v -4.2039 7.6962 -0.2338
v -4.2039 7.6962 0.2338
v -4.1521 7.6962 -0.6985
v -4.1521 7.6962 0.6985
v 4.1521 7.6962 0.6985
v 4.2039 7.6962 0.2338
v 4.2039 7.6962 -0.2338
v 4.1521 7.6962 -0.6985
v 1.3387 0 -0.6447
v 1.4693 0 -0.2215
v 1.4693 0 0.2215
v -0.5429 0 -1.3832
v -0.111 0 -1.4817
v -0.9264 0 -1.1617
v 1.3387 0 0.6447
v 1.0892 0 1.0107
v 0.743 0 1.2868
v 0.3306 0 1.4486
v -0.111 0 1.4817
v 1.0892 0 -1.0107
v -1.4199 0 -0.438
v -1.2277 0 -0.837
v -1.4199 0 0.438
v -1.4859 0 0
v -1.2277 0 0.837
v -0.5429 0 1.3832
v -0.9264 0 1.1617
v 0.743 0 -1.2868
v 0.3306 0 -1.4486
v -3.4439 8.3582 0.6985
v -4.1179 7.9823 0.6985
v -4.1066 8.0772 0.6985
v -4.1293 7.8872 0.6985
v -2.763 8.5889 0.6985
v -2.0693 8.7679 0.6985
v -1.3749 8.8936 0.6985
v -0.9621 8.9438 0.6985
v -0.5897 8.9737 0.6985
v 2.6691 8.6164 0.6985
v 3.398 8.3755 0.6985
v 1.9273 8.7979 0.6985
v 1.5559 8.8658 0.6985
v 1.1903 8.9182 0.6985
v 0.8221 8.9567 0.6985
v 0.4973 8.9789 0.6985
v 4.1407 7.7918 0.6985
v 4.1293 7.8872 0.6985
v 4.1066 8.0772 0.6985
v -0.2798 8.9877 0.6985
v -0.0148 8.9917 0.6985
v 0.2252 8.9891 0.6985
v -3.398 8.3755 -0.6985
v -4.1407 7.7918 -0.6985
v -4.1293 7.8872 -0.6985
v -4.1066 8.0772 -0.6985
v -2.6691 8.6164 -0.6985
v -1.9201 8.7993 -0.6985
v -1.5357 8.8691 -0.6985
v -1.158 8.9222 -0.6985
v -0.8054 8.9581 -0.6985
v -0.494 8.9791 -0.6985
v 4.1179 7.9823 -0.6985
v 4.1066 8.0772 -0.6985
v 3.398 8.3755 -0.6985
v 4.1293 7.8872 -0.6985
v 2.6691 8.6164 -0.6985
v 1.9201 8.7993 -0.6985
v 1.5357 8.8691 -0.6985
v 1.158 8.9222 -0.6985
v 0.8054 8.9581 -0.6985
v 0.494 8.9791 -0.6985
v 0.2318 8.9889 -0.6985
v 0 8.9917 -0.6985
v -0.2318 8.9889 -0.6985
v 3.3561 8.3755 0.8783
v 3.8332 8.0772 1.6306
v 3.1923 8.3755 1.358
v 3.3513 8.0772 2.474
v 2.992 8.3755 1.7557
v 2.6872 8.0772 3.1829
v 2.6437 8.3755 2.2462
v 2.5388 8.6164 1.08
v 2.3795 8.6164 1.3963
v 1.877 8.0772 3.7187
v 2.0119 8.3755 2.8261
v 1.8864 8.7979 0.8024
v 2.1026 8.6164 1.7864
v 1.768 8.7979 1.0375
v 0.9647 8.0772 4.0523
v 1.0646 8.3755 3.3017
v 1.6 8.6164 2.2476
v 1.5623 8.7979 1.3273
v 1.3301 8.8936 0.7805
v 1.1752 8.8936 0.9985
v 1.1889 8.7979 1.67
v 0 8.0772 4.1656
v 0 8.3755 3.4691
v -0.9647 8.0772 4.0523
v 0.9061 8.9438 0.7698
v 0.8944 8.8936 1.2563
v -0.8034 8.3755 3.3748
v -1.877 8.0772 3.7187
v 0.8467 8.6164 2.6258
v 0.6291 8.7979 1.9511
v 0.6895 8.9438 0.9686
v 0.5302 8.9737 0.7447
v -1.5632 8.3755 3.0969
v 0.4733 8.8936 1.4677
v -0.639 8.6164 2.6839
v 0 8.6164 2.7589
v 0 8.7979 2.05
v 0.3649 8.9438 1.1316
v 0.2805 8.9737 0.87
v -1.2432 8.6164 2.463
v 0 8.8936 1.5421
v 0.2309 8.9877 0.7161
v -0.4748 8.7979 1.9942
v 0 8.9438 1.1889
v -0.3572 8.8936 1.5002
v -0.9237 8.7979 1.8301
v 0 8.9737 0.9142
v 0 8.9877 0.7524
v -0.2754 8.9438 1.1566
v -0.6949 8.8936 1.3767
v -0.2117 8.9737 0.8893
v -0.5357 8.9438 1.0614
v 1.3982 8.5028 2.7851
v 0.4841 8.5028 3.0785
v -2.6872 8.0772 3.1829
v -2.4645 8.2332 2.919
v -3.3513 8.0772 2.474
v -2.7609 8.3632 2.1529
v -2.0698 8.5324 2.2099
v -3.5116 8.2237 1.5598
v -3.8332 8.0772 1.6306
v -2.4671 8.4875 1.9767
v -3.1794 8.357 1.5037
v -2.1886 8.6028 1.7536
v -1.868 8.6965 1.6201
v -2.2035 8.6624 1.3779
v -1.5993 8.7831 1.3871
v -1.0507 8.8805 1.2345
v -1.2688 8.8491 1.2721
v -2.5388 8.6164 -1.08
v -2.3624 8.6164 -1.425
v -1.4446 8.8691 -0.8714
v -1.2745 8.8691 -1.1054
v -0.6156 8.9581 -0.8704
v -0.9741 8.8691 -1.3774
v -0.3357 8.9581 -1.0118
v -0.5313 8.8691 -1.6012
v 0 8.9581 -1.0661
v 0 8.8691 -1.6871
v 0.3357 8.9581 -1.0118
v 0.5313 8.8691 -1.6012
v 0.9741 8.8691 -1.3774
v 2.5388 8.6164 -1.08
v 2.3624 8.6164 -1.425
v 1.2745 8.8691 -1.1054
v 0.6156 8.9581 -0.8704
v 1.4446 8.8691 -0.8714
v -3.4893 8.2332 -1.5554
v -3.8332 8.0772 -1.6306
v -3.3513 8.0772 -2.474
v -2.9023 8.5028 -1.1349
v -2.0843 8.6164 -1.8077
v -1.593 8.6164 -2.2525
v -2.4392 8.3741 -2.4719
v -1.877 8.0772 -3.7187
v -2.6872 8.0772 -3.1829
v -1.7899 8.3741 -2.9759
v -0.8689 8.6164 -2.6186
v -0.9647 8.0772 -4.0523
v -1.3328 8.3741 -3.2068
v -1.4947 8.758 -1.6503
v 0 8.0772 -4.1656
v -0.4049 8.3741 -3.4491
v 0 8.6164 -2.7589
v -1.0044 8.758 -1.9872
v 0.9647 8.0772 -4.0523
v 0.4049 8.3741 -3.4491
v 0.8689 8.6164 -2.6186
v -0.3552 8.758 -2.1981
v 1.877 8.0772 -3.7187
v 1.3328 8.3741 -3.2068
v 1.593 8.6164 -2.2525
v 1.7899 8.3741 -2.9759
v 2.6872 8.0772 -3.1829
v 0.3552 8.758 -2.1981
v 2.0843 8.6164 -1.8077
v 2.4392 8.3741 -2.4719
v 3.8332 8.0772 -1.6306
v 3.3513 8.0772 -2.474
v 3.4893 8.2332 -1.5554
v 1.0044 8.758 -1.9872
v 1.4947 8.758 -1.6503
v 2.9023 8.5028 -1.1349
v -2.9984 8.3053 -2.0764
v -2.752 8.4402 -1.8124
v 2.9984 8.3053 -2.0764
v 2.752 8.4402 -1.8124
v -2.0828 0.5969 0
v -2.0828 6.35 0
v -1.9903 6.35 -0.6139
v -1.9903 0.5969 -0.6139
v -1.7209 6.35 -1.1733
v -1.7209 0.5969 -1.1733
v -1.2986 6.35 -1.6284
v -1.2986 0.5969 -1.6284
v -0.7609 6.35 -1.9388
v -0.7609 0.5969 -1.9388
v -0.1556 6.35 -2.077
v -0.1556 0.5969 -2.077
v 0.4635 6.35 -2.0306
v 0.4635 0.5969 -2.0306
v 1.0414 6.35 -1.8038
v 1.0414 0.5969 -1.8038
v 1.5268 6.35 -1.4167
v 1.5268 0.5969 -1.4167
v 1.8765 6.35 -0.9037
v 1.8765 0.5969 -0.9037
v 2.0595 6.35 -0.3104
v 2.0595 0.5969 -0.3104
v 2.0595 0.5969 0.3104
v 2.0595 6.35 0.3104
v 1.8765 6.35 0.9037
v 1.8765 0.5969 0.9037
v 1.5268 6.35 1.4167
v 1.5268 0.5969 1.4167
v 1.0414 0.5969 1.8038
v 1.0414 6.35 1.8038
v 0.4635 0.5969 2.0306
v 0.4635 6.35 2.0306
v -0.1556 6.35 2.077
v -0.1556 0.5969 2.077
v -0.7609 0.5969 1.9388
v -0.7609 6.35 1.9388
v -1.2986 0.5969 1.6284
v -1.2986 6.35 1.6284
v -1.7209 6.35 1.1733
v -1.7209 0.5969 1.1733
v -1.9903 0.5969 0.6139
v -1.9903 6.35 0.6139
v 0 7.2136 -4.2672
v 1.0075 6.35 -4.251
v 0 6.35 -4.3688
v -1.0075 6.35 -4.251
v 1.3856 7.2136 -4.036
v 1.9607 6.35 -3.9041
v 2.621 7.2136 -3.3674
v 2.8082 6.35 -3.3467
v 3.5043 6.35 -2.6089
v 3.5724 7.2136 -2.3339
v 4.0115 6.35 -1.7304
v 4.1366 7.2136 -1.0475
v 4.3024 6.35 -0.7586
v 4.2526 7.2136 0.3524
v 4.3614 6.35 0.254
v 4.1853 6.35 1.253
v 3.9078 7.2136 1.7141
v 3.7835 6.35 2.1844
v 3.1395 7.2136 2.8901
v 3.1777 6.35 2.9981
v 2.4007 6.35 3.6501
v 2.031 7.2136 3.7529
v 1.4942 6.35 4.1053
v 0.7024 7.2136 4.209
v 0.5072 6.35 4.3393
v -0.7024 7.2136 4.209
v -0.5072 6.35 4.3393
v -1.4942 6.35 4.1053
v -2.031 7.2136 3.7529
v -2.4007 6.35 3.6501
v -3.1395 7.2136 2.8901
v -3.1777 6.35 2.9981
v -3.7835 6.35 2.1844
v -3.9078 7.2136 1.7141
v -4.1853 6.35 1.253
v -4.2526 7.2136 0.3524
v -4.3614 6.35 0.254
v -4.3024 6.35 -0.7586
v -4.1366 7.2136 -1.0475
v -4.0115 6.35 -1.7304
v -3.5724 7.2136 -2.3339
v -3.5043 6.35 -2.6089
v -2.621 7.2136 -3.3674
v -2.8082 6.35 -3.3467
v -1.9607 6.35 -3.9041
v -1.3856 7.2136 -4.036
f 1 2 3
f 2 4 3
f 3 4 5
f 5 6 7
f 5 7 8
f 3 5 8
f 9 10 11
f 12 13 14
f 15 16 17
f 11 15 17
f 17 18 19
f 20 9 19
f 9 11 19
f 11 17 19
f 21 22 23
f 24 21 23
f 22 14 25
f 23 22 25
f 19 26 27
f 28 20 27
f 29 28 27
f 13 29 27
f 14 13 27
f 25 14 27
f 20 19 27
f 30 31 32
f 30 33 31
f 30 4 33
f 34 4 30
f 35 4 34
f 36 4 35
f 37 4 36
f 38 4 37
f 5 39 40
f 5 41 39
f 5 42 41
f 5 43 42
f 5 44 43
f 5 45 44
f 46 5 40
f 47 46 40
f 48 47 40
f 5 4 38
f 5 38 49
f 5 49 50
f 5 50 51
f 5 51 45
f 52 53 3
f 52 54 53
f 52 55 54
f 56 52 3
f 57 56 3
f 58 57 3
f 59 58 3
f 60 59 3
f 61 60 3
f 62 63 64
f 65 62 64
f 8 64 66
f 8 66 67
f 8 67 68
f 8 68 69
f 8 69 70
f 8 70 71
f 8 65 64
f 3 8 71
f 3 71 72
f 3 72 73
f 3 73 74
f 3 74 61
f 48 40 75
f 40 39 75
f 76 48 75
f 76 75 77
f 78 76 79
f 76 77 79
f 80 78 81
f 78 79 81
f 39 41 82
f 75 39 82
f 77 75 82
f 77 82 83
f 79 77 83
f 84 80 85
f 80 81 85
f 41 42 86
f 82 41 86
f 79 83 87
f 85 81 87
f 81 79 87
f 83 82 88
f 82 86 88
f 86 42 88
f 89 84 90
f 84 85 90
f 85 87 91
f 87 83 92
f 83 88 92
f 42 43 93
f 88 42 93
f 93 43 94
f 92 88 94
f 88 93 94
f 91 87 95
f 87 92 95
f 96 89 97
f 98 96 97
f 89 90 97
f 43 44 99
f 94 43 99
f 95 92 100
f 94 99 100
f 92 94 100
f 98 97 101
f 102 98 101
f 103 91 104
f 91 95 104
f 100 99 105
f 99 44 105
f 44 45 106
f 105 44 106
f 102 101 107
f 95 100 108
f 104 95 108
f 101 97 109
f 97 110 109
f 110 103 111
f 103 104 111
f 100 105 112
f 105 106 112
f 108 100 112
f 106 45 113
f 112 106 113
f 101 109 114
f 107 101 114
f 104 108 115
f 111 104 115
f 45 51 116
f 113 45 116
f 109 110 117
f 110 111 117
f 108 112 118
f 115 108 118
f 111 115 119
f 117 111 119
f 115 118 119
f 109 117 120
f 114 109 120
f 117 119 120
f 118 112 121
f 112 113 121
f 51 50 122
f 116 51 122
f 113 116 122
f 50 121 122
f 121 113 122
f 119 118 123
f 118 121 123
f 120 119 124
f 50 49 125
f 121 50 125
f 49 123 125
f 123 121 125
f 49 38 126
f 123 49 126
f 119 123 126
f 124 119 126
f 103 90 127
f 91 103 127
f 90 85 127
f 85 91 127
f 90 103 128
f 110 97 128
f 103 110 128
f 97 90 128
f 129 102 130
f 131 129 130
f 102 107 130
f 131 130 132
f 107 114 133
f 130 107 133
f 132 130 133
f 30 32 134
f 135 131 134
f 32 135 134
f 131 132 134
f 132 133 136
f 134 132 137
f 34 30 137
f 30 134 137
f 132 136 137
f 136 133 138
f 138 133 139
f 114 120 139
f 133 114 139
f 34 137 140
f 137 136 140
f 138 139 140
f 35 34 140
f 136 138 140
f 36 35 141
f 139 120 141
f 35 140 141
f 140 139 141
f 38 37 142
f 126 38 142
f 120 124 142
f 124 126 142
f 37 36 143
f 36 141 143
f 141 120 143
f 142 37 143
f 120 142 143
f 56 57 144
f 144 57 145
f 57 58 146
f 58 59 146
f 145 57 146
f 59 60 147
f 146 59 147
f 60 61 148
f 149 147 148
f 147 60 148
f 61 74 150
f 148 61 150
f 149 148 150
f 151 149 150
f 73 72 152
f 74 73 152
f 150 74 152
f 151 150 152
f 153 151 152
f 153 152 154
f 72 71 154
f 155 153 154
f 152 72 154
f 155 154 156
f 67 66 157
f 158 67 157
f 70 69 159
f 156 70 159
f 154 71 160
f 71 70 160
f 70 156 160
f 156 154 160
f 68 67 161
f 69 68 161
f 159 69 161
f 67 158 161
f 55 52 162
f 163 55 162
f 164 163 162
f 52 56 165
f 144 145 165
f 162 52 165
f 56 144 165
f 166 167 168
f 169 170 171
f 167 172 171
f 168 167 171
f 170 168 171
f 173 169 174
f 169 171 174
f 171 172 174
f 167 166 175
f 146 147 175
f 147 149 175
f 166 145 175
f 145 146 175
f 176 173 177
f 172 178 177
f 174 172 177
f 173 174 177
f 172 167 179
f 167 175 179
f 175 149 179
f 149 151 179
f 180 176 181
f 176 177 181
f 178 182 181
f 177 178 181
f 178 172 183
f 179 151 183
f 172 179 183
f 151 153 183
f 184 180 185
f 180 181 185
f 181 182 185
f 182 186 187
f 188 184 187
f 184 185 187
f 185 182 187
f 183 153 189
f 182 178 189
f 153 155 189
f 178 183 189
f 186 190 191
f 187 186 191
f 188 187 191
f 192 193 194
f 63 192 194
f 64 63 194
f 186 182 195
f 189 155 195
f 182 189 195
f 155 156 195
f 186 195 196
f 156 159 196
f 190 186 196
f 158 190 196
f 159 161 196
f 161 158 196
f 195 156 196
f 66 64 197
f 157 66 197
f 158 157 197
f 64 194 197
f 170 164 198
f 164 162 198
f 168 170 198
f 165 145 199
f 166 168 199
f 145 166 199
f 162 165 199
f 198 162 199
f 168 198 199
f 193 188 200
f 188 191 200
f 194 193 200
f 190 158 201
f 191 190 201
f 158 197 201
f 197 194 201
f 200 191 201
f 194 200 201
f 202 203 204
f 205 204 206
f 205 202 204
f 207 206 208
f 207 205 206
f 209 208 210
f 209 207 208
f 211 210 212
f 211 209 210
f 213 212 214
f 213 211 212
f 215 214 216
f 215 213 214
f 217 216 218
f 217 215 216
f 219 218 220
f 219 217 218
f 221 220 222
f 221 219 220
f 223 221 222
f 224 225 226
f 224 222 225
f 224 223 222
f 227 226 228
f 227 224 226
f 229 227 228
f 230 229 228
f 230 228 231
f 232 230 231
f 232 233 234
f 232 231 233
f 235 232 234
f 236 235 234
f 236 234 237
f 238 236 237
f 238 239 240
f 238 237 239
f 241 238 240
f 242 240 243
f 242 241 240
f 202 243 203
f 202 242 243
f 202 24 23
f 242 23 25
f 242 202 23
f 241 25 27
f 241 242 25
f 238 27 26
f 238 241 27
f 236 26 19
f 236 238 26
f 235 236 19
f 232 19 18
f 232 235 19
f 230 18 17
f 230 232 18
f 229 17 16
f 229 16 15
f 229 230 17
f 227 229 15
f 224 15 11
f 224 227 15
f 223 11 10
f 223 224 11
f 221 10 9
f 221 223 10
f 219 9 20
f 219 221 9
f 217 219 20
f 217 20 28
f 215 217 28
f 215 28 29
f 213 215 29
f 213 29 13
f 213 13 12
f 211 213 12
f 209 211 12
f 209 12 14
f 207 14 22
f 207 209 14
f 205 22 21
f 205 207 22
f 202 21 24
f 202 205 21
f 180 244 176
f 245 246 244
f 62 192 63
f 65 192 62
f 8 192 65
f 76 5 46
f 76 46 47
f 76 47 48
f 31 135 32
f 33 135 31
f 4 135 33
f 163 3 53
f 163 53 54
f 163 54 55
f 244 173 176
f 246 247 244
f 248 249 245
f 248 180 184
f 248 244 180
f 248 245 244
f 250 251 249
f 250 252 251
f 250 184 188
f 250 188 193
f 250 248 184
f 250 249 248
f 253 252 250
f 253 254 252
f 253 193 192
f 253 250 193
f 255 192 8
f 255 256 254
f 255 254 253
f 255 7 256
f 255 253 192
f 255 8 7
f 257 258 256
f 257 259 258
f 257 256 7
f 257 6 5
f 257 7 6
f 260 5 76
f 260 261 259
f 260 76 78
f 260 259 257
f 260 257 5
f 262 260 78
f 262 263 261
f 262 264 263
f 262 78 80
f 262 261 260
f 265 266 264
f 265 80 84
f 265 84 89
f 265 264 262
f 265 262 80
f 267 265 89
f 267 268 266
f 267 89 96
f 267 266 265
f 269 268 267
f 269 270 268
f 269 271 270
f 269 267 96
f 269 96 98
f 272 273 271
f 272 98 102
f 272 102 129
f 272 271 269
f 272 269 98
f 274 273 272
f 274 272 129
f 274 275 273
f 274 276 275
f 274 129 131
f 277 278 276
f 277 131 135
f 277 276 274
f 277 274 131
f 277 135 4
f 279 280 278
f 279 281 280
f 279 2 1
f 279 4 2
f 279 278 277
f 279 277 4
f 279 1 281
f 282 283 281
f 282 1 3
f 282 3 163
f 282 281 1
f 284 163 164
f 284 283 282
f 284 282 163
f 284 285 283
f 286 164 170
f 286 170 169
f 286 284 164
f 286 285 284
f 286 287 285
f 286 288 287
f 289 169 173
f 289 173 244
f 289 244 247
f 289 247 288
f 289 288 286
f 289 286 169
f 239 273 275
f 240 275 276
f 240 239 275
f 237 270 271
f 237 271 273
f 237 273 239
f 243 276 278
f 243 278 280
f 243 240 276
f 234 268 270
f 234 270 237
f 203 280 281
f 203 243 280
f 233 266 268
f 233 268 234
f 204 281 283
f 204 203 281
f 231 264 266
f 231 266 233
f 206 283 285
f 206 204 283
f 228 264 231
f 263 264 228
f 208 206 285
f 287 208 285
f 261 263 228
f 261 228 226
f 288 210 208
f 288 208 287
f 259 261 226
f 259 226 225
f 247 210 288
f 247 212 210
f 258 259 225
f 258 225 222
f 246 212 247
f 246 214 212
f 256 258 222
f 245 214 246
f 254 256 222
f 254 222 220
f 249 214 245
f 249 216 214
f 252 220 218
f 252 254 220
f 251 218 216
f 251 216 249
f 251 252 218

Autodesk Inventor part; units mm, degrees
ref_plane "YZ Plane" through (0, 0, 0) normal (1, 0, 0) x (0, 1, 0)
ref_plane "XZ Plane" through (0, 0, 0) normal (0, 1, 0) x (-1, 0, 0)
ref_plane "XY Plane" through (0, 0, 0) normal (0, 0, 1) x (1, 0, 0)
sketch "Sketch1" plane through (0, 0, 0) normal (0, 1, 0) x (-1, 0, 0)
  circle A0 centre (0, 0) radius 2.0828
  dimension "d4" = 4.1656
extrude "Body" add sketch "Sketch1" along normal blind 6.35
sketch "Sketch2" plane through (0, 0, 0) normal (1, 0, 0) x (0, 1, 0)
  line L0 (6.35, -2.0828) -> (6.35, 2.0828) projected
  line L1 (6.35, 0) -> (6.35, -4.3688)
  line L2 (8.0772, 0) -> (6.35, 0)
  line L3 (8.0772, 0) -> (8.0772, -4.1656)
  arc A0 (8.0772, -4.1656) -> (9.0169, 0) centre (-0.6859, 0) ccw
  line L4 (6.35, -4.3688) -> (8.0772, -4.1656)
  line L5 (8.0772, 0) -> (9.0169, 0)
  point P0 (0, 0)
  point P1 (6.35, -2.0828)
  dimension "d5" = 4.3688
  dimension "d13" = 1.7272
  dimension "d57" = 4.1656
  dimension "d58" = 9.7028
  dimension "d59" = 0
revolve "Head" add sketch "Sketch2" angle 360 about axis through (0, 8.0772, 0) along (0, -1, 0)
sketch "Sketch5" plane through (0, 0, 0) normal (1, 0, 0) x (0, 1, 0)
  line L0 (0, -2.0828) -> (6.35, -2.0828) projected
  line L1 (6.35, 4.3688) -> (6.35, -4.3688) projected
  line L2 (6.35, -2.0828) -> (6.35, 2.0828) projected
  line L3 (0.0745, -2.0828) -> (-0.2261, -2.6035)
  line L4 (-0.2261, -2.6035) -> (-0.3253, -2.6035)
  line L5 (-0.3253, -2.6035) -> (-0.626, -2.0828)
  line L6 (0.0686, -2.6035) -> (-0.7252, -2.6035) construction
  line L7 (-0.626, -2.0828) -> (0.0745, -2.0828)
  line L8 (0, -2.0828) -> (6.35, -2.0828) projected
  point P0 (0, 0)
  dimension "d31" = 30
  dimension "d32" = 60
  dimension "a" = 0.0992
  dimension "d46" = 0.7937
  dimension "d54" = 0.0686
  dimension "d55" = 0.5207
  dimension "d56" = 0.0992
feature "Thread" [suppressed]
sketch "Sketch6" plane through (0, 0, 0) normal (0, 0, 1) x (1, 0, 0)
  line L0 (0, 0) -> (-1.4859, 0)
  line L1 (2.0828, 0) -> (-2.0828, 0) projected
  line L2 (-1.4859, 0) -> (-2.4948, 1.0089)
  line L3 (-2.4948, 1.0089) -> (-2.9651, -1.2188)
  line L4 (-2.9651, -1.2188) -> (-1.4859, -1.2188)
  line L5 (-2.0828, 0) -> (-2.0828, 6.35) projected
  line L6 (-1.4859, -1.2188) -> (-1.4859, 0)
  line L7 (0, -2.7326) -> (0, 7.8638) projected
  point P0 (-2.0828, 0.5969)
  dimension "d49" = 1.4859
  dimension "d50" = 135
revolve "Tapered End" cut sketch "Sketch6" angle 360 about axis through (0, -10, 0) along (0, 1, 0)
sketch "Sketch7" plane through (0, 0, 0) normal (1, 0, 0) x (0, 1, 0)
  line L0 (6.35, 4.3688) -> (6.35, -4.3688) projected
  line L1 (7.6962, 0.6985) -> (7.6962, -0.6985)
  line L2 (7.6962, 0.6985) -> (9.7028, 0.6985)
  line L3 (9.7028, 0.6985) -> (9.7028, -0.6985)
  line L4 (9.7028, -0.6985) -> (7.6962, -0.6985)
  point P0 (0, 0)
  dimension "d61" = 1.397
  dimension "d62" = 0.6985
  dimension "d65" = 7.6962
  dimension "d66" = 2.0066
extrude "Flathead" cut sketch "Sketch7" against normal mid plane 12.7
equation "\"d56\" = a"
properties part number "Screw 8-32 Nylon 1.250" material "Black"
